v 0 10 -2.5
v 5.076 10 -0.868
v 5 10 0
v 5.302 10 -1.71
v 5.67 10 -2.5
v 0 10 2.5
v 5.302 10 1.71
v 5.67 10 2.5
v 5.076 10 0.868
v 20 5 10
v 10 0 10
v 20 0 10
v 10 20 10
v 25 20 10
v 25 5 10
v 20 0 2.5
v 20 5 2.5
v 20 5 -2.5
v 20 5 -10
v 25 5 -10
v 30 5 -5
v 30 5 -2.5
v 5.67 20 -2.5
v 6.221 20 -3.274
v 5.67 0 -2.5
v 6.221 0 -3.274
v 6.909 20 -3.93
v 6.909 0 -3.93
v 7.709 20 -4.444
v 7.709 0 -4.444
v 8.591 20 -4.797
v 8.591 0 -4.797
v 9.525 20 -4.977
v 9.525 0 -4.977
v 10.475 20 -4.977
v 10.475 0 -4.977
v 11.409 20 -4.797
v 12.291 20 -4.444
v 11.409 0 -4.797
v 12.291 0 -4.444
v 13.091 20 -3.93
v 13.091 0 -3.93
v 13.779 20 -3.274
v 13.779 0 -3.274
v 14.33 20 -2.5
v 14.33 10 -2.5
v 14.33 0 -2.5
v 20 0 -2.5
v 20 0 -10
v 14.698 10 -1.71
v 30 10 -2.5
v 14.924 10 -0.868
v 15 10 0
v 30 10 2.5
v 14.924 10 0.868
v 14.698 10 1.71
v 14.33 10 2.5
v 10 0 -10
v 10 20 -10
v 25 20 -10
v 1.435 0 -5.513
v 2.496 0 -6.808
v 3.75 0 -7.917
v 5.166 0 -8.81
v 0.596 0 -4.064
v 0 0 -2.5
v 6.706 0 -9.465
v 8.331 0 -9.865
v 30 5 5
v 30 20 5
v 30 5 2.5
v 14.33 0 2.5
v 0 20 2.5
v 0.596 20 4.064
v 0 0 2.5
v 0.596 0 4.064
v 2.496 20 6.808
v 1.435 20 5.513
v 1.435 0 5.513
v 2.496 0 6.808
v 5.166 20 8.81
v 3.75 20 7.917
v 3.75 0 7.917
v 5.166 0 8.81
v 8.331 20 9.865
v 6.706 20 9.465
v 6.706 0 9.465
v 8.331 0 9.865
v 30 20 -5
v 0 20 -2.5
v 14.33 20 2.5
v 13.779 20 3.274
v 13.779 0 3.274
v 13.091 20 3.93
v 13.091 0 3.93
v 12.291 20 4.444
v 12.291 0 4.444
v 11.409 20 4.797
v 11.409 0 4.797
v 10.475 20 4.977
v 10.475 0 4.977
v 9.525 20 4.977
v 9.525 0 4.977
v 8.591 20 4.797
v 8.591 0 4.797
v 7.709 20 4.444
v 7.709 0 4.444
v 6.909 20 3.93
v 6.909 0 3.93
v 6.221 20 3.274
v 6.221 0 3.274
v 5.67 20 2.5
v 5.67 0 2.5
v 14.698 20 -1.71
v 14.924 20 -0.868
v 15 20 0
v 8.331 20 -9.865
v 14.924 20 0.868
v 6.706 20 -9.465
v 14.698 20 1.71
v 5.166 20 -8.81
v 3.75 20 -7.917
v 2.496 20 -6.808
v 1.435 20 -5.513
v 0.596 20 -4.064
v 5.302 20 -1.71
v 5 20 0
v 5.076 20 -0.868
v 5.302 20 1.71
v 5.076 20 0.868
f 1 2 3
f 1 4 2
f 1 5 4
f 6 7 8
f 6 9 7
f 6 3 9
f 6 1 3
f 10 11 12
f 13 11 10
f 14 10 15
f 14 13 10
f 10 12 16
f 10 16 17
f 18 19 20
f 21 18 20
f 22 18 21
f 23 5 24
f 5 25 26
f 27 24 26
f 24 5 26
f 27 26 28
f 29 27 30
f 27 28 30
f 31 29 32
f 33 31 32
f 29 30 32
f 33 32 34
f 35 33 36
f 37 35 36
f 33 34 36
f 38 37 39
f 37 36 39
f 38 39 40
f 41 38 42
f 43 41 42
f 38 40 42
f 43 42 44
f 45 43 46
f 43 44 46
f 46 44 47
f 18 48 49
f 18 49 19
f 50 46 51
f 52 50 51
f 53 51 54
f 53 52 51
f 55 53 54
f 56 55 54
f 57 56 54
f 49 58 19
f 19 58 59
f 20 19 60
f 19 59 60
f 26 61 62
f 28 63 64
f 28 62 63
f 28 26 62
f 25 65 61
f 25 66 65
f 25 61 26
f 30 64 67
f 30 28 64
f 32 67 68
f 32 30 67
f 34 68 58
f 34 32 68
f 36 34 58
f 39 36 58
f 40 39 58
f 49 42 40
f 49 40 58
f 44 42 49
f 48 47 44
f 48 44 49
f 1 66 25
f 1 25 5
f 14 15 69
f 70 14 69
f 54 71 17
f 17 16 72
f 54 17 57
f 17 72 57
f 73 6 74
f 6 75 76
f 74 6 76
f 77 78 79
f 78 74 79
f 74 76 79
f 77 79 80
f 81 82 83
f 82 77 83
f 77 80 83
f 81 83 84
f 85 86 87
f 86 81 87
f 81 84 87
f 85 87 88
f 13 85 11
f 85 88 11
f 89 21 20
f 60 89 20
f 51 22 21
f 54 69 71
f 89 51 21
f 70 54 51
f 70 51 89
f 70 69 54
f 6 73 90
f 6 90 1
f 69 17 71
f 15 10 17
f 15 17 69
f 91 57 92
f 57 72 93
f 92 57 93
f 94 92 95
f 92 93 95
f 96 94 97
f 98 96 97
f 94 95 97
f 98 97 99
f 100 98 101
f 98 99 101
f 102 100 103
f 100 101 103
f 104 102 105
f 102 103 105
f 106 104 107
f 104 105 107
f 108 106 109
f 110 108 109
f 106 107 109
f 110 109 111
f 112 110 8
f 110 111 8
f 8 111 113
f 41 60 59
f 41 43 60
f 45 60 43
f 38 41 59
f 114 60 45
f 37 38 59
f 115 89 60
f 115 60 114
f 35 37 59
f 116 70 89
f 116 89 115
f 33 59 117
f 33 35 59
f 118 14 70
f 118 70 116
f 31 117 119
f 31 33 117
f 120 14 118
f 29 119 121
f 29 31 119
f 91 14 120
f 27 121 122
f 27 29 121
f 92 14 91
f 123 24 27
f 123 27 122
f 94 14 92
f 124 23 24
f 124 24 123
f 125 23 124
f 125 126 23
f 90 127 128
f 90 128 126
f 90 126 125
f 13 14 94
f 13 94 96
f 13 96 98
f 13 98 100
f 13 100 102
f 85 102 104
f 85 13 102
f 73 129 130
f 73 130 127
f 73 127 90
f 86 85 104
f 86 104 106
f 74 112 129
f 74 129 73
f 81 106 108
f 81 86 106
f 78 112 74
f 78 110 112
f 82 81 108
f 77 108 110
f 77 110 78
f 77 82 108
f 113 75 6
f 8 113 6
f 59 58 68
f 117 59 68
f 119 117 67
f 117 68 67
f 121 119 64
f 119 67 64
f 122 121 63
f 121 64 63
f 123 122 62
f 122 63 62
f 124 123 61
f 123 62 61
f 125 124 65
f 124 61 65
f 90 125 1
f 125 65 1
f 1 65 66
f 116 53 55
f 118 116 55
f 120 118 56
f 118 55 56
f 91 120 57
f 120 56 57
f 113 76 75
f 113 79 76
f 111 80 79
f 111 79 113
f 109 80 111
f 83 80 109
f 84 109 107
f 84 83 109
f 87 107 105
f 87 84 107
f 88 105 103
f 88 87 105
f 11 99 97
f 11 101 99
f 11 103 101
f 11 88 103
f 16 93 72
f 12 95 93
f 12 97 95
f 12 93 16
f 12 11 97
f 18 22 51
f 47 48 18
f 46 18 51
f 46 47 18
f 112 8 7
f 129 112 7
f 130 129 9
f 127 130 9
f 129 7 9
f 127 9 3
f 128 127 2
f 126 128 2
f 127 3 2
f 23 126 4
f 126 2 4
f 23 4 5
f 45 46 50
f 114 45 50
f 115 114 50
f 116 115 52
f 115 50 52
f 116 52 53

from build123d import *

# Parameters (mm, degrees)
F0_W     = 5
F0_H     = 15
F1_DEPTH = 10
F3_DEPTH = 20.001
F4_W     = 10
F4_H     = 5
F5_DEPTH = 30.001


with BuildPart() as f1:
    # F0 (on Top) → F1 (new body, symmetric)
    with BuildSketch(Plane.XY):
        Polygon((0, 20), (0, 0), (20, 0), (20, 5), (25, 5), (25, 20), align=None)
        with Locations((27.5, 12.5)):
            Rectangle(F0_W, F0_H)
    extrude(amount=F1_DEPTH, both=True)

    # F2 (on Front) → F3 (cut, through all)
    with BuildSketch(Plane.XZ):
        with BuildLine():
            Line((0, 10), (0, 2.5))
            ThreePointArc((0, 2.5), (3.75, 7.916667), (10, 10))
            Line((10, 10), (0, 10))
        make_face()
        with BuildLine():
            ThreePointArc((10, -10), (3.75, -7.916667), (0, -2.5))
            Line((0, -2.5), (0, -10))
            Line((0, -10), (10, -10))
        make_face()
        Polygon((25, 10), (30, 5), (30, 10), align=None)
        Polygon((30, -10), (30, -5), (25, -10), align=None)
        with BuildLine():
            ThreePointArc((14.330127, -2.5), (14.829629, -1.294095), (15, 0))
            ThreePointArc((15, 0), (14.829629, 1.294095), (14.330127, 2.5))
            ThreePointArc((14.330127, 2.5), (10, 5), (5.669873, 2.5))
            ThreePointArc((5.669873, 2.5), (5, 0), (5.669873, -2.5))
            ThreePointArc((5.669873, -2.5), (10, -5), (14.330127, -2.5))
        make_face()
    extrude(amount=-F3_DEPTH, mode=Mode.SUBTRACT)

    # F4 (on Right) → F5 (cut, through all)
    with BuildSketch(Plane.YZ):
        with Locations((5, 0)):
            Rectangle(F4_W, F4_H)
    extrude(amount=F5_DEPTH, mode=Mode.SUBTRACT)


solid = f1.part
